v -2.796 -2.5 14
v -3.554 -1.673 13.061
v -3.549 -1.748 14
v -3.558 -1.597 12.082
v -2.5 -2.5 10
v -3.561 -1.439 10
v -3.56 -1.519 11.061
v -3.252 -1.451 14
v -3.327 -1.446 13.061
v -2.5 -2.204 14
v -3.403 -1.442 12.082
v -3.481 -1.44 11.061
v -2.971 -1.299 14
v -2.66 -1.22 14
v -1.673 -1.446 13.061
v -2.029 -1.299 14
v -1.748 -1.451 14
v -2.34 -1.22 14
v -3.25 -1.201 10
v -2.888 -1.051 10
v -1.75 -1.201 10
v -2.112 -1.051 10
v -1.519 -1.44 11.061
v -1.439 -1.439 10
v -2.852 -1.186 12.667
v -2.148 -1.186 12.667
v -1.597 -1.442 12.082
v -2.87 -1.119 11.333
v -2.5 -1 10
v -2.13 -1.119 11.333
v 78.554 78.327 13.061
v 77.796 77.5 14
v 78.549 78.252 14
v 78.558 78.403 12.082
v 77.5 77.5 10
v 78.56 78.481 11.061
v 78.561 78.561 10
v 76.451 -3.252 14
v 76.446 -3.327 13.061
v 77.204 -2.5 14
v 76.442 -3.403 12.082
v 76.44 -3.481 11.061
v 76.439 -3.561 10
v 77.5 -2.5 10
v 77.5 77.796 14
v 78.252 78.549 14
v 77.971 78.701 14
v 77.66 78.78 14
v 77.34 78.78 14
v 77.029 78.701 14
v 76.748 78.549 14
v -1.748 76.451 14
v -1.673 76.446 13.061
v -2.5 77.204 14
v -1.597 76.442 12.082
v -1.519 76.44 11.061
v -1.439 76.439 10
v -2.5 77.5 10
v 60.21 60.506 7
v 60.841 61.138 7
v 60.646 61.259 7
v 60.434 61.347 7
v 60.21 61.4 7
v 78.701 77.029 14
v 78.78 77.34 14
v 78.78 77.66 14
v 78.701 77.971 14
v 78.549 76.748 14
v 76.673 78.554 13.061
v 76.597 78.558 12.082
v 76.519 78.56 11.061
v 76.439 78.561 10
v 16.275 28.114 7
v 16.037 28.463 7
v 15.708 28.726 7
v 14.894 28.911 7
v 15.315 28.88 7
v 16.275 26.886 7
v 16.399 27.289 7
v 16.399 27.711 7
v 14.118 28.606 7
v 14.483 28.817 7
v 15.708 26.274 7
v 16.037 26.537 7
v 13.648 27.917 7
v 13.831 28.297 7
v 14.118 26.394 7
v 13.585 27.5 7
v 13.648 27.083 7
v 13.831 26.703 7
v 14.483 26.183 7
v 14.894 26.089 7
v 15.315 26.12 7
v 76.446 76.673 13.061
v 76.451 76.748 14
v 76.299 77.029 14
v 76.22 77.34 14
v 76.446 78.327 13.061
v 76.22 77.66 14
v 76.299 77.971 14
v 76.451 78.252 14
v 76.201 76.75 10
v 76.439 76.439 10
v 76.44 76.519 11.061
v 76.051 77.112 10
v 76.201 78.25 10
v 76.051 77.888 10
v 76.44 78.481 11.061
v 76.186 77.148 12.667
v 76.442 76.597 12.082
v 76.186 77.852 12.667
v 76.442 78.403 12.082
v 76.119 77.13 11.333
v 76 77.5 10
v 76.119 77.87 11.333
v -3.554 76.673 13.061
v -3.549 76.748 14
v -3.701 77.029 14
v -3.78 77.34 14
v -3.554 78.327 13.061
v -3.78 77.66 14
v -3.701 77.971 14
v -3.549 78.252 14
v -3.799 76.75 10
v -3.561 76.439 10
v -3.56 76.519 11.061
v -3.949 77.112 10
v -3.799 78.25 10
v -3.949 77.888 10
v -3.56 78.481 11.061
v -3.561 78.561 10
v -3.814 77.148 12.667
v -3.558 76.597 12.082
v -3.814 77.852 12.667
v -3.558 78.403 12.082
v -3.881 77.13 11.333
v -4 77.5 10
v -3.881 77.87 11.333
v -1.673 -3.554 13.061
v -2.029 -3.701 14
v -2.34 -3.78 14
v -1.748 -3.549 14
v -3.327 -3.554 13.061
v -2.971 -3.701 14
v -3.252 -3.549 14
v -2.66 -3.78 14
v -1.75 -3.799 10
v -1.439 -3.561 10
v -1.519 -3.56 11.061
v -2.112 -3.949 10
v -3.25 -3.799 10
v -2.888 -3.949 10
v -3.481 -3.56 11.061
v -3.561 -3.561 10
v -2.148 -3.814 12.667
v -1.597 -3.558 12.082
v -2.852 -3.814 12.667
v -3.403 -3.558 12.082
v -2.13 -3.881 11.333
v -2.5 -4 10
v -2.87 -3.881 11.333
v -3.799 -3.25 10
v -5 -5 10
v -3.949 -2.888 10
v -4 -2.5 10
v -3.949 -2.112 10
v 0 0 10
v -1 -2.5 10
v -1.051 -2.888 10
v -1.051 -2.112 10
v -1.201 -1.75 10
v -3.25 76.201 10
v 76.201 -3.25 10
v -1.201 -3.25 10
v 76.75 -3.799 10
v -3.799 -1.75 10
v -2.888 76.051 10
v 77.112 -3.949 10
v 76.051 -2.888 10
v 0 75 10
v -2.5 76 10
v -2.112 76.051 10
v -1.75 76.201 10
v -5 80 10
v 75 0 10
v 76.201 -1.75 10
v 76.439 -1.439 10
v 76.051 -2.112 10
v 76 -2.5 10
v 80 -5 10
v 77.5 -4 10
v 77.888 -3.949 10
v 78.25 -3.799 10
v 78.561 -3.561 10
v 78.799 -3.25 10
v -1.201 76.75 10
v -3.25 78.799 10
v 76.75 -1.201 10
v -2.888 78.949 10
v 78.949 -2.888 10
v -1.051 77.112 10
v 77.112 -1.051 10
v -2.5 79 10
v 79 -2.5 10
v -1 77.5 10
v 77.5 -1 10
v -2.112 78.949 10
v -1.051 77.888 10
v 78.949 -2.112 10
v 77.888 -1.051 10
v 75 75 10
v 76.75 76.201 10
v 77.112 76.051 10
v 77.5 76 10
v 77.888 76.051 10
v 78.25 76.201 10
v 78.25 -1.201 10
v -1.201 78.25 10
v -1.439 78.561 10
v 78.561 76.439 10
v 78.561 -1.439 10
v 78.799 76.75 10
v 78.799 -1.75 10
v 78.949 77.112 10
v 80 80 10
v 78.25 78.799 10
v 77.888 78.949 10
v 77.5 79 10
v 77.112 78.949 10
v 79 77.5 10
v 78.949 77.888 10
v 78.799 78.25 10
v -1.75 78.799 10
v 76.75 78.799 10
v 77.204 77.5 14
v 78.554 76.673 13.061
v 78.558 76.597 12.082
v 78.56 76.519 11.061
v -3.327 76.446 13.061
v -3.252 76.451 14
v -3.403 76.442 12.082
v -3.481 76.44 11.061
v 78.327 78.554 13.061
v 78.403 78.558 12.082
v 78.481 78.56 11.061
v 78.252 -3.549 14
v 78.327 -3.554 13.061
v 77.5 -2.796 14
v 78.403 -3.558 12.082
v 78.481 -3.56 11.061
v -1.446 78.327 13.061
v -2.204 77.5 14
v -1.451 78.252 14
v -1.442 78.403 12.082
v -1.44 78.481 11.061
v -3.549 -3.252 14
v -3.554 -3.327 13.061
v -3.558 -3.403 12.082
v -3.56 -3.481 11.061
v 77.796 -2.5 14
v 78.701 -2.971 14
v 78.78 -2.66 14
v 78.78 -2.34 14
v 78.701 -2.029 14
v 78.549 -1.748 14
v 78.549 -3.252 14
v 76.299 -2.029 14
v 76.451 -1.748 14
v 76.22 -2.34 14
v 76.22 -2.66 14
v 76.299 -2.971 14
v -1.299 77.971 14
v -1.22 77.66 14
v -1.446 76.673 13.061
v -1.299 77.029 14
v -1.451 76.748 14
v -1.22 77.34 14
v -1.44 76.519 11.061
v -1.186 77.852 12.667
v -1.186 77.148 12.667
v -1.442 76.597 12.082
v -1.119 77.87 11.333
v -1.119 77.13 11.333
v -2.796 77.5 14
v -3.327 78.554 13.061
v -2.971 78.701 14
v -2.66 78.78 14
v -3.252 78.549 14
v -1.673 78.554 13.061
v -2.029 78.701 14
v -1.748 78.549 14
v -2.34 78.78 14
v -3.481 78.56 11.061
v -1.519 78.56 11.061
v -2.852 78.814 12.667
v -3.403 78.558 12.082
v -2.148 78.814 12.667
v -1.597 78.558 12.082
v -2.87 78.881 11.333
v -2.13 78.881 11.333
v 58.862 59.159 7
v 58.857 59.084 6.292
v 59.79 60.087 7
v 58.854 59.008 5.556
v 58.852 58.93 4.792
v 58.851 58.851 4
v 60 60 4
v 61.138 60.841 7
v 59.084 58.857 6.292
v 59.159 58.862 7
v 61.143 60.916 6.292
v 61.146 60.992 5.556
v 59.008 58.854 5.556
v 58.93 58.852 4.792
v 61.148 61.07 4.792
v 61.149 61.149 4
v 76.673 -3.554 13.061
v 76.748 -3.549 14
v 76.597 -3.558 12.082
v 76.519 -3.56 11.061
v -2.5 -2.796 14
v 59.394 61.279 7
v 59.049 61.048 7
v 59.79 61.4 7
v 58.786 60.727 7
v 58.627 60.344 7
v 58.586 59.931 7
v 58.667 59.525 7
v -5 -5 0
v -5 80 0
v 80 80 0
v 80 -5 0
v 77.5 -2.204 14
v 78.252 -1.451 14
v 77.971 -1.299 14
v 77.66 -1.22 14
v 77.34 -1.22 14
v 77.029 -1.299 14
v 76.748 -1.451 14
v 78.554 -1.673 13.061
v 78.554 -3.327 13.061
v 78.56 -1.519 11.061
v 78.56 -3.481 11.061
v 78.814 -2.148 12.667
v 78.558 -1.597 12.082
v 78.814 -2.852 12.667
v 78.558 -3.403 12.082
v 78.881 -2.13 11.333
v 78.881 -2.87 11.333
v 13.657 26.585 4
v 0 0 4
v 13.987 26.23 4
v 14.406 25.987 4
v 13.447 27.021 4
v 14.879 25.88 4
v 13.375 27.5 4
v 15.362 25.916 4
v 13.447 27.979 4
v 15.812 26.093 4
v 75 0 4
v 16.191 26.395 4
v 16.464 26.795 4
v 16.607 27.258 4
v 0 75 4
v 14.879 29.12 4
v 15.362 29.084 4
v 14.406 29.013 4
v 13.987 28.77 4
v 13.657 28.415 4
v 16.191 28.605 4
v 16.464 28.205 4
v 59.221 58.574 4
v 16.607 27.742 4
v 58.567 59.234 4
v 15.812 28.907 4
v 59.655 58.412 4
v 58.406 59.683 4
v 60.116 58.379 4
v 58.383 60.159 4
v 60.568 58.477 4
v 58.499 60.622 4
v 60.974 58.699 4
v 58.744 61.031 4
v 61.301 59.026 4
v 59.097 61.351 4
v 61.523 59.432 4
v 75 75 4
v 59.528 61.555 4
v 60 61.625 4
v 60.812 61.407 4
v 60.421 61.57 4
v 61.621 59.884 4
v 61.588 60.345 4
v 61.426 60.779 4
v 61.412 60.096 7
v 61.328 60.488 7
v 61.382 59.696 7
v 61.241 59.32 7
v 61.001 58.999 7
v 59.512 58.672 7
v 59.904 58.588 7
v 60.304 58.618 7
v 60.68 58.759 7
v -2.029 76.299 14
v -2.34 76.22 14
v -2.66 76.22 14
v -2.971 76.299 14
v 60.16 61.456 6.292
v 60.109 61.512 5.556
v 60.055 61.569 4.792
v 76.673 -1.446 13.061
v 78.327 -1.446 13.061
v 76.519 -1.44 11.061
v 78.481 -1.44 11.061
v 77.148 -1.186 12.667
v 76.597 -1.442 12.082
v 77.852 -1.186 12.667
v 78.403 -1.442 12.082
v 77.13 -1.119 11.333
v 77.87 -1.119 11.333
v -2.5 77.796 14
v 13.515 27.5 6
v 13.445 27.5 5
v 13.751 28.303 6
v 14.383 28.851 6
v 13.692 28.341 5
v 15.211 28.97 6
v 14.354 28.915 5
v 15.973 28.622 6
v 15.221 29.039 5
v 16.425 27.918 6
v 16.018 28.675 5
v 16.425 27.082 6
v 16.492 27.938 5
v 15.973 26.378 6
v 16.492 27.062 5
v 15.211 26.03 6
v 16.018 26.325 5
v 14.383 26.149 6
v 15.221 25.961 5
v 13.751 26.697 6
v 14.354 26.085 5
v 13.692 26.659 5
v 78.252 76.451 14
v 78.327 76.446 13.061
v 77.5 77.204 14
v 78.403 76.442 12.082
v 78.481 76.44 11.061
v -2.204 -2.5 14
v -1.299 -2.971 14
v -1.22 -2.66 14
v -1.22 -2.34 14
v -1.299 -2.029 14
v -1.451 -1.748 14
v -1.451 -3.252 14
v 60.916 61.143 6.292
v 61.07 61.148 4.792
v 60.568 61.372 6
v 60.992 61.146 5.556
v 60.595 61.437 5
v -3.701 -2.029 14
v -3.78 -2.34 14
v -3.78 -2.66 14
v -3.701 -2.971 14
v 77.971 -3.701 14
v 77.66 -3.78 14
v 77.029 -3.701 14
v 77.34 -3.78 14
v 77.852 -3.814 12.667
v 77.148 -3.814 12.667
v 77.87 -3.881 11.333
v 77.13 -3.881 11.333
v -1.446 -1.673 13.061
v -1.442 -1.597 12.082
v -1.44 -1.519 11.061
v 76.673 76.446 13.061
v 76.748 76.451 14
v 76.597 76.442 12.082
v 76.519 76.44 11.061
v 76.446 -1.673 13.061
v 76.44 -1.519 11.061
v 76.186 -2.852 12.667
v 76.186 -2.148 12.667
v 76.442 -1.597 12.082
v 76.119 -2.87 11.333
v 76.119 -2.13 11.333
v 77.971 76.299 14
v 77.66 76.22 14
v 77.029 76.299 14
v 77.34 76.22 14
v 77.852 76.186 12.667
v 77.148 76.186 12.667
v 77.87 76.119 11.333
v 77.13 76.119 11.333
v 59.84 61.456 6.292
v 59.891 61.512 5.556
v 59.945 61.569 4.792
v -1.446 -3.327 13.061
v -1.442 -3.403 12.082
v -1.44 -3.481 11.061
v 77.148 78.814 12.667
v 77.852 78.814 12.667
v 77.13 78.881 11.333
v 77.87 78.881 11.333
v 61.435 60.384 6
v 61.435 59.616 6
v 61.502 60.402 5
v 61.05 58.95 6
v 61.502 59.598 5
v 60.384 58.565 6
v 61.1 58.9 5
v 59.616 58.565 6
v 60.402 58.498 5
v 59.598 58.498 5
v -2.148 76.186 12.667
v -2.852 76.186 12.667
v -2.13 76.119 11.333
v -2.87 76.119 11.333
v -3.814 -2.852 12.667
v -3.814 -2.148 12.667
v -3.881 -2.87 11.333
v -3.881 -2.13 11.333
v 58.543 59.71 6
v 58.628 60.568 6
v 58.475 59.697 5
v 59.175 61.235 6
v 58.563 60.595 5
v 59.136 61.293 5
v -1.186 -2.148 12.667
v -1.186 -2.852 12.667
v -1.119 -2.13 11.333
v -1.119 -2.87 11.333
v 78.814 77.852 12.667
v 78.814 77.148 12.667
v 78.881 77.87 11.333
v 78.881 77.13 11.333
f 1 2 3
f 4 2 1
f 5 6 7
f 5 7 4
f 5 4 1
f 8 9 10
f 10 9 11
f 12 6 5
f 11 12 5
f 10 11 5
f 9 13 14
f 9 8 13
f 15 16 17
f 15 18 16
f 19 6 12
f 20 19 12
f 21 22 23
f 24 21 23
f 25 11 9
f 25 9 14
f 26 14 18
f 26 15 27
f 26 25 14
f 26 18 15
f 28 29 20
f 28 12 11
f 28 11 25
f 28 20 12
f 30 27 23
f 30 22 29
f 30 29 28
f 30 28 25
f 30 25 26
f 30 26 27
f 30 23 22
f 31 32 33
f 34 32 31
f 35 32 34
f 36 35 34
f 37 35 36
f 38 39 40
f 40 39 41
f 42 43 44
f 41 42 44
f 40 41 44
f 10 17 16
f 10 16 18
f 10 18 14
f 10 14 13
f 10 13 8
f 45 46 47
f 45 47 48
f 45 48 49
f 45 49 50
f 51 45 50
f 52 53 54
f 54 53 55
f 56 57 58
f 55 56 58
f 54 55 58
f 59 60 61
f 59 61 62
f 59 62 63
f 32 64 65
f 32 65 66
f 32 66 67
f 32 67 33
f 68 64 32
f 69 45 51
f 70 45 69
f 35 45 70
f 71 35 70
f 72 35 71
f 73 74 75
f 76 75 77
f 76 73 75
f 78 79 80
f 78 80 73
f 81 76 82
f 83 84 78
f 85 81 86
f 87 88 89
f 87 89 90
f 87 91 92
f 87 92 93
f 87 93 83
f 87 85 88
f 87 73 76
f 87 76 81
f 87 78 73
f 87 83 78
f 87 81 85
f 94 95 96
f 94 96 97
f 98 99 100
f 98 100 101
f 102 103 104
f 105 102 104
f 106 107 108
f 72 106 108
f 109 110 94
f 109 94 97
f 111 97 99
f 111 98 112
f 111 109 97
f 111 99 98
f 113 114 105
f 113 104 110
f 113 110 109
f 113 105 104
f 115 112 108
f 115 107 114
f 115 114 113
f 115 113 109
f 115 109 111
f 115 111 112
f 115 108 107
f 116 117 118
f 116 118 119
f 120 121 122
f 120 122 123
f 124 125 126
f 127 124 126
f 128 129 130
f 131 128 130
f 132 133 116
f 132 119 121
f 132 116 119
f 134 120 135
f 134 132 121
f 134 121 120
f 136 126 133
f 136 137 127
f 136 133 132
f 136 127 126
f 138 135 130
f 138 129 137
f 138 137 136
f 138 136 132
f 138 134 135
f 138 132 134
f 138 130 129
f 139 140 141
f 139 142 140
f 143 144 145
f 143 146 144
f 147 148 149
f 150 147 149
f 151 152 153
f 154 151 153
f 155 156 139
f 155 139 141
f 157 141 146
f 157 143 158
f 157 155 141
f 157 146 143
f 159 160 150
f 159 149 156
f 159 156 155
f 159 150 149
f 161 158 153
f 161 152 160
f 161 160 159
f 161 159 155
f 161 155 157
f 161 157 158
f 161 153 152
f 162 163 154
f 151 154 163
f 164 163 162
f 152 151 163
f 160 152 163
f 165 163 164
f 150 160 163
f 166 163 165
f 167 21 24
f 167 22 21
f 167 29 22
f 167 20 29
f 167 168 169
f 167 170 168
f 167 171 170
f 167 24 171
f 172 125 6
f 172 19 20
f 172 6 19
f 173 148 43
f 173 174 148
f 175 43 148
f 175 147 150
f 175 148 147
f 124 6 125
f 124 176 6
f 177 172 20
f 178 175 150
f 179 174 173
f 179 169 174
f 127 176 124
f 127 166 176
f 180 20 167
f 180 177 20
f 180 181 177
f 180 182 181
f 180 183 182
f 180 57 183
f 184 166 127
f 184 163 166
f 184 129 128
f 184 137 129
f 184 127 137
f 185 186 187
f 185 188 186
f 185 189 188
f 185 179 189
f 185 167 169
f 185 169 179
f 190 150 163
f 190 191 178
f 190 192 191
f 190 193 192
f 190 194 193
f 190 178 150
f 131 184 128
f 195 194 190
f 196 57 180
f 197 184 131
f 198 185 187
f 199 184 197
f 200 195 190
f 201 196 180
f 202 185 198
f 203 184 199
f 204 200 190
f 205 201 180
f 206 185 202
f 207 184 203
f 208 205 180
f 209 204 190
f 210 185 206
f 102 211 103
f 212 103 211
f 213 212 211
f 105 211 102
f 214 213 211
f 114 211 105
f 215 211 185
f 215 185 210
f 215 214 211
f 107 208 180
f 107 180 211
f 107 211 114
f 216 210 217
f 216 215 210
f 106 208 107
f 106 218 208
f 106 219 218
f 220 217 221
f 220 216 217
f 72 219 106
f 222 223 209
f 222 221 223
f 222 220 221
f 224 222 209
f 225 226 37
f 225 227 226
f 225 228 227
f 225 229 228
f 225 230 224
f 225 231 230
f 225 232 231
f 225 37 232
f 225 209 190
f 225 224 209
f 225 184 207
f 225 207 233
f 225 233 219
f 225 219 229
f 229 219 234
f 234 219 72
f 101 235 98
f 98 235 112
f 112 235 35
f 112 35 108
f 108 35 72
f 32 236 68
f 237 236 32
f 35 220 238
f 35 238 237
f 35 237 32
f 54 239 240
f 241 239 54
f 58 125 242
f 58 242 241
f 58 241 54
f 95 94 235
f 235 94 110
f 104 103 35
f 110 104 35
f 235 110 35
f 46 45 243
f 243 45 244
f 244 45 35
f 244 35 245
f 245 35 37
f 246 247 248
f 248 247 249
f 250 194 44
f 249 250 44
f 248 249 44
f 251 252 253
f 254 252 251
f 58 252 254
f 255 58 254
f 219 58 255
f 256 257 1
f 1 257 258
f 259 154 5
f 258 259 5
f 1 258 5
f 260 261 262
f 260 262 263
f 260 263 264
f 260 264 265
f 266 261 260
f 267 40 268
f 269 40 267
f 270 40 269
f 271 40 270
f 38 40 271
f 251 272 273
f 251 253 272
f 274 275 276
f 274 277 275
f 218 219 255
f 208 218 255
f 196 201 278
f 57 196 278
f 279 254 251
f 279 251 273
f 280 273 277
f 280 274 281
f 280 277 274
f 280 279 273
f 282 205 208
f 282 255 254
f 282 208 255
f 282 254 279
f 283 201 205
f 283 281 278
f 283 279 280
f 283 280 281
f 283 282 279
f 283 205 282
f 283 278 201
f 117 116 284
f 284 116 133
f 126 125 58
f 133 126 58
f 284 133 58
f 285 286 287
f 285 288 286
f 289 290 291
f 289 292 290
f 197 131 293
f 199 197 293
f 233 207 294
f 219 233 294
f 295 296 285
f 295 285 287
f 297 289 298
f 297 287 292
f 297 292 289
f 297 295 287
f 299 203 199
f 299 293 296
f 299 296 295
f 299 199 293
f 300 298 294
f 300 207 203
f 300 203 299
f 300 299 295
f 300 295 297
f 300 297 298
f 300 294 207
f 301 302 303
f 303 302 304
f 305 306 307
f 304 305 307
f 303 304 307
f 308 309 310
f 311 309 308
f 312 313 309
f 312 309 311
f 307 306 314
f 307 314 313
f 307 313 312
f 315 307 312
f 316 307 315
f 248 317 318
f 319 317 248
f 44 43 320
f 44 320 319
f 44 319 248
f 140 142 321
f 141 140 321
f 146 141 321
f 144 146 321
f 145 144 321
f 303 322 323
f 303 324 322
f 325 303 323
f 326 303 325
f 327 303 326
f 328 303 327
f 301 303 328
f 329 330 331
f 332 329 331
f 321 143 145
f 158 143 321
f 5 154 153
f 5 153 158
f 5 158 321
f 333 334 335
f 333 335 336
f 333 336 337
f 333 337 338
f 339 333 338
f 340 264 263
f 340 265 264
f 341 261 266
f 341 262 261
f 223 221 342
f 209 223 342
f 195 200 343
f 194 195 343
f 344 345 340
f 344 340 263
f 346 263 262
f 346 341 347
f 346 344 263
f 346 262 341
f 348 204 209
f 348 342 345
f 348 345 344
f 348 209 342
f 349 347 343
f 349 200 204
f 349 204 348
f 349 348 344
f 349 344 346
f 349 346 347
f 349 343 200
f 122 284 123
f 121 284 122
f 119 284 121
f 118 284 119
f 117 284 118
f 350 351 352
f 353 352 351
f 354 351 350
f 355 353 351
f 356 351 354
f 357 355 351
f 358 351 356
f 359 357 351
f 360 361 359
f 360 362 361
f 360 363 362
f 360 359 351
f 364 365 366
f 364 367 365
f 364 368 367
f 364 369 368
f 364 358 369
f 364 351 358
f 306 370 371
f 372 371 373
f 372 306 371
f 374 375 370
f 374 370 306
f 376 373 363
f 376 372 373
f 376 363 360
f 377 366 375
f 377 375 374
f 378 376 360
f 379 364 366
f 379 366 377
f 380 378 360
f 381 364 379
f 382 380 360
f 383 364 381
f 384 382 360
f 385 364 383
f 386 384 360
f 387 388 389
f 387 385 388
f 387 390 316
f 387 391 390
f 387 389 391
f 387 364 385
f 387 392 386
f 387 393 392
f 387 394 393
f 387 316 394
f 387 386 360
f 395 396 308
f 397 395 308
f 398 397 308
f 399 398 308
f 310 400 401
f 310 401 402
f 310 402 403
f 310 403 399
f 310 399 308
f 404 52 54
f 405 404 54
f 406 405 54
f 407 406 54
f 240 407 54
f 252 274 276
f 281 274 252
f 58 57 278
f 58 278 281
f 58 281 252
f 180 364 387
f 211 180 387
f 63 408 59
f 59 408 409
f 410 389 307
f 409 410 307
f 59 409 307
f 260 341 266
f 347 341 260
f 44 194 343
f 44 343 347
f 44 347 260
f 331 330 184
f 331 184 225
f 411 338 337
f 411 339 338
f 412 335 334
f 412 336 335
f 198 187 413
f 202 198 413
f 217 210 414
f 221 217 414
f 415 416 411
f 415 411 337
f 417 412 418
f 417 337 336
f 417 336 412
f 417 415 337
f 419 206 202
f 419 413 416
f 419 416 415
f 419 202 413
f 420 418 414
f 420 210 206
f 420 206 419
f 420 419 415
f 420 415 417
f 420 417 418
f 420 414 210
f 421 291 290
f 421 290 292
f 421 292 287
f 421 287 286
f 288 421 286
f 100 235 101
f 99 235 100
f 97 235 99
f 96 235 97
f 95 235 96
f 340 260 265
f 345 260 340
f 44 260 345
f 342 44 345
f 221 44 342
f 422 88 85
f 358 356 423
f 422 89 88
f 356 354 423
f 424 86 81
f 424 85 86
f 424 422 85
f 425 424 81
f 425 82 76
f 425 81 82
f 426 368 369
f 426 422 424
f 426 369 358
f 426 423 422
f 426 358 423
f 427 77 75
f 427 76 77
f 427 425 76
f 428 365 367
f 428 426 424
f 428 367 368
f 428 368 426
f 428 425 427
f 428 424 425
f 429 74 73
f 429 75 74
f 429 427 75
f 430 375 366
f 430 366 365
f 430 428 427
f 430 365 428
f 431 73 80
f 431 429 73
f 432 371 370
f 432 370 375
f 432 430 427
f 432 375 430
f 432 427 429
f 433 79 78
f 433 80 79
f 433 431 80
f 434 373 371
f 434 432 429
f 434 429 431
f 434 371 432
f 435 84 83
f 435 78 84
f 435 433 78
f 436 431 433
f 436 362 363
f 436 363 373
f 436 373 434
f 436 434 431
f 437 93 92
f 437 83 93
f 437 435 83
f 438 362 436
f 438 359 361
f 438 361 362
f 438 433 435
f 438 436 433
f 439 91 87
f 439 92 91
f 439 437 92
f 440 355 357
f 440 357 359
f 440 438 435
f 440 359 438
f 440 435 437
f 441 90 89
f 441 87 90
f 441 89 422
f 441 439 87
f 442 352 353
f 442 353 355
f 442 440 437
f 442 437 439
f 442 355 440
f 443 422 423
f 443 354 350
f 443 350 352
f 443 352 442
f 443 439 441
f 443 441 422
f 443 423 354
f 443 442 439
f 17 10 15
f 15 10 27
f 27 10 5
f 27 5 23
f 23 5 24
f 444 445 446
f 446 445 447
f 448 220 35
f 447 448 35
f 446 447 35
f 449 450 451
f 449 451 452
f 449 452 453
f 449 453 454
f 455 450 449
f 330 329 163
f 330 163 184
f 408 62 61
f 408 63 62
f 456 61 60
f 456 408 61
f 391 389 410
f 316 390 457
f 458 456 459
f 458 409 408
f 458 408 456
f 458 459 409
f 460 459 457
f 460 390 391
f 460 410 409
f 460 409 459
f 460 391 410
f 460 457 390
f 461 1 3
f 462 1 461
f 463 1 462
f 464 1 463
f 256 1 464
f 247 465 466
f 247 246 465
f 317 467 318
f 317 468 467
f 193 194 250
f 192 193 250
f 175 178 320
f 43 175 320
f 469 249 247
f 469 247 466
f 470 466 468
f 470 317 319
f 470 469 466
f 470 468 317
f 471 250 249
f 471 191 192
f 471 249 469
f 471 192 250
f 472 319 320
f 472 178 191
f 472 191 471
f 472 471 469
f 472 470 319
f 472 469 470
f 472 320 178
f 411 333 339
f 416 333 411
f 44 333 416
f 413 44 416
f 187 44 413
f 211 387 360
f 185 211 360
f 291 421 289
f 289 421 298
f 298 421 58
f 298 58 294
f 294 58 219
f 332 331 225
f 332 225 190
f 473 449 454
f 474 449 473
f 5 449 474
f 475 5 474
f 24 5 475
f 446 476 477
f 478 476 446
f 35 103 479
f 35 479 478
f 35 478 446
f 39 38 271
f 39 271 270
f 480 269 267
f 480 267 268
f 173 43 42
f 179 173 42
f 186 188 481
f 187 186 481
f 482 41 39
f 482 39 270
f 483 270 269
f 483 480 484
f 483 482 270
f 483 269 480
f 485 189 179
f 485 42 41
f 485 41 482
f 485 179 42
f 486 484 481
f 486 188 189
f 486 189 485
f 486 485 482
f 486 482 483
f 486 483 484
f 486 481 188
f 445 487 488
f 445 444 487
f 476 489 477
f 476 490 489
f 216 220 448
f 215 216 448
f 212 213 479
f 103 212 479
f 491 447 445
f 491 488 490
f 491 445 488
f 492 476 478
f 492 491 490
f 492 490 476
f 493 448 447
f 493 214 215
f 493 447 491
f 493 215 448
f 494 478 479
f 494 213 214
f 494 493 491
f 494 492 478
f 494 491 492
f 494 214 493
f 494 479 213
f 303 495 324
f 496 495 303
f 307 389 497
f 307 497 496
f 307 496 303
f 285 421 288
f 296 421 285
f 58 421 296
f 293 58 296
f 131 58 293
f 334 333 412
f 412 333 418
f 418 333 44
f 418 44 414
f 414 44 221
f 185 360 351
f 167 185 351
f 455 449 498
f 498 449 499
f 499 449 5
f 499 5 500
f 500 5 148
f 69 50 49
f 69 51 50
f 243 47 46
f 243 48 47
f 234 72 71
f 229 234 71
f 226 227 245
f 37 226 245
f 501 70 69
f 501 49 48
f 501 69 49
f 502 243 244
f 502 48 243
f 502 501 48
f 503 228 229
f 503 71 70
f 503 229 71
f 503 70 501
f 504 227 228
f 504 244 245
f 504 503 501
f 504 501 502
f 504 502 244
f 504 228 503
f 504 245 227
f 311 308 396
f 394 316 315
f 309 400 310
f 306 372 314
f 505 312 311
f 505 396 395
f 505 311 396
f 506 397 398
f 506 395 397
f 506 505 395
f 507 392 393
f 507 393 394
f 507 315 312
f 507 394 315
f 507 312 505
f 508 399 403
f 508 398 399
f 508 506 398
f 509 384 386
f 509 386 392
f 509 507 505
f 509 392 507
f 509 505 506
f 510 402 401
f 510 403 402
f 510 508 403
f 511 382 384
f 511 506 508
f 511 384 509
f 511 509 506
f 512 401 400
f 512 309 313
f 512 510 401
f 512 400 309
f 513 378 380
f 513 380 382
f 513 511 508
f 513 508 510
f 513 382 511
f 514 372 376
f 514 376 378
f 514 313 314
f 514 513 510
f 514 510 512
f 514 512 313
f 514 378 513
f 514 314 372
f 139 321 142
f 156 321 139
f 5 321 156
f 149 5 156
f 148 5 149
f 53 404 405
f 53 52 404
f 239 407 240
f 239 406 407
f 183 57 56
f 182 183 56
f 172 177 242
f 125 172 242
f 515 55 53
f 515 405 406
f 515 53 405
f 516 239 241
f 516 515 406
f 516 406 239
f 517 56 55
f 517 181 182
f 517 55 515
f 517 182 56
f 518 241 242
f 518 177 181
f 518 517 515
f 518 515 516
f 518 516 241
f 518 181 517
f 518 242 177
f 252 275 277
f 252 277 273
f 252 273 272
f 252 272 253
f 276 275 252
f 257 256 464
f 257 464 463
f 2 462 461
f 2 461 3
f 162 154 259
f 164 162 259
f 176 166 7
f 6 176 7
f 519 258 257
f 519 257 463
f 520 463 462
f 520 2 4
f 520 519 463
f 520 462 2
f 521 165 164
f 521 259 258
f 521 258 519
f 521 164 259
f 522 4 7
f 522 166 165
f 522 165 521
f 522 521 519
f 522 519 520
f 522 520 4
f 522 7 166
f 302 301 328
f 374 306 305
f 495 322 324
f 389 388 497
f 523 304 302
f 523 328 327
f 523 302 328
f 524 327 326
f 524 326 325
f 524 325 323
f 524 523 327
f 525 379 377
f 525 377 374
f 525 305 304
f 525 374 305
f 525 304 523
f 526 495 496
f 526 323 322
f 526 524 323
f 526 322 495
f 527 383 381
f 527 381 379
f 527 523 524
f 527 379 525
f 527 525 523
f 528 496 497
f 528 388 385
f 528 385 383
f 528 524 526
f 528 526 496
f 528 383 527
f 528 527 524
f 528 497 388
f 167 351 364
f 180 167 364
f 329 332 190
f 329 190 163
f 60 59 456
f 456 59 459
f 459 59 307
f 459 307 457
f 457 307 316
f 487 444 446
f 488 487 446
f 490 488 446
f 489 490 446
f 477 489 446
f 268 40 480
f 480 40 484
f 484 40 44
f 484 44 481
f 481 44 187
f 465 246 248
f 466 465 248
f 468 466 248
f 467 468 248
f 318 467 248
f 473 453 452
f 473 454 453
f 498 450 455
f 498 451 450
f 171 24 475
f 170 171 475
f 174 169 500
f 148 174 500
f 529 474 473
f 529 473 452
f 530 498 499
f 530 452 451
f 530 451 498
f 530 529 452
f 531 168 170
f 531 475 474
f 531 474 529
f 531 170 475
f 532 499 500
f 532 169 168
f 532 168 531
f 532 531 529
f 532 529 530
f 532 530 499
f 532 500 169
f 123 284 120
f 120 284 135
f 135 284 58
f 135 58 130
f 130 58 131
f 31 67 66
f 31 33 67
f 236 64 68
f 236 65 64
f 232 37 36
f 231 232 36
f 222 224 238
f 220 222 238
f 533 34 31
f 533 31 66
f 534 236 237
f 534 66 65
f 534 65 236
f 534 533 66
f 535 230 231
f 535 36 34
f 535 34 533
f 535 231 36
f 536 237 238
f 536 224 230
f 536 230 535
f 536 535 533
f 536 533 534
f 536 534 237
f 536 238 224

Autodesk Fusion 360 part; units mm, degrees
sketch "Sketch1" plane through (0, 0, 0) normal (0, 0, 1) x (1, 0, 0)
  line L0 (0, 0) -> (0, 75)
  line L1 (0, 75) -> (75, 75)
  line L2 (75, 75) -> (75, 0)
  line L3 (75, 0) -> (0, 0)
  line L4 (-5, -5) -> (-5, 80)
  line L5 (-5, 80) -> (80, 80)
  line L6 (80, 80) -> (80, -5)
  line L7 (80, -5) -> (-5, -5)
  dimension "d1" = 75
  dimension "d2" = 75
  dimension "d3" = 75
  dimension "d4" = 75
  dimension "d5" = 85
  dimension "d6" = 85
  dimension "d7" = 85
  dimension "d8" = 85
extrude "Extrude1" add sketch "Sketch1" along normal blind 10
sketch "Sketch2" plane through (0, 0, 0) normal (0, 1, 0) x (1, 0, 0)
sketch "Sketch3" plane through (0, 0, 0) normal (0, 0, 1) x (1, 0, 0)
  line L0 (0, 0) -> (75, 0)
  line L1 (75, 0) -> (75, 75)
  line L2 (75, 75) -> (0, 75)
  line L3 (0, 75) -> (0, 0)
extrude "Extrude2" add sketch "Sketch3" along normal blind 4
sketch "Sketch4" plane through (0, 0, 4) normal (0, 0, 1) x (-1, 0, 0)
  line L0 (0, -75) -> (0, 0)
  line L1 (0, 0) -> (-75, 0)
  line L2 (-75, 0) -> (-75, -75)
  line L3 (-75, -75) -> (0, -75)
  line L4 (0, 0) -> (-75, -75)
  line L5 (-75, 0) -> (0, -75)
  line L6 (-37.5, -37.5) -> (-37.5, -65)
  line L7 (-37.5, -37.5) -> (-65, -37.5)
  line L8 (-65, -37.5) -> (-65, -10)
  line L9 (-37.5, -65) -> (-10, -65)
  line L10 (-10, -65) -> (-65, -65)
  line L11 (-65, -65) -> (-65, -10)
  line L12 (-65, -10) -> (-10, -10)
  line L13 (-10, -10) -> (-10, -65)
  line L14 (-65, -65) -> (-60, -65)
  line L15 (-60, -65) -> (-60, -60)
  circle A0 centre (-60, -60) radius 1.625
  line L16 (-10, -10) -> (-10, -27.5)
  line L17 (-10, -27.5) -> (-15, -27.5)
  circle A1 centre (-15, -27.5) radius 1.625
  dimension "d13" = 27.5
  dimension "d14" = 27.5
  dimension "d15" = 27.5
  dimension "d16" = 27.5
  dimension "d17" = 5
  dimension "d18" = 5
  dimension "d19" = 3.25
  dimension "d20" = 17.5
  dimension "d21" = 5
  dimension "d22" = 3.25
extrude "Extrude3" add sketch "Sketch4" along normal blind 3 draft -4 contours A1 | L4 A0 | L4 L15 A0 | L4 L15 A0
sketch "Sketch5" plane through (0, 0, 10) normal (0, 0, 1) x (-1, 0, 0)
  line L0 (-75, -75) -> (-75, 0)
  line L1 (-75, 0) -> (0, 0)
  line L2 (0, 0) -> (0, -75)
  line L3 (0, -75) -> (-75, -75)
  line L4 (-80, 5) -> (-80, -80)
  line L5 (-80, -80) -> (5, -80)
  line L6 (5, -80) -> (5, 5)
  line L7 (5, 5) -> (-80, 5)
  line L8 (5, 5) -> (0, 0)
  line L9 (5, 0) -> (0, 5)
  circle A0 centre (2.5, 2.5) radius 1.5
  line L10 (-75, -75) -> (-80, -80)
  line L11 (-80, -75) -> (-75, -80)
  circle A1 centre (-77.5, -77.5) radius 1.5
  line L12 (0, -75) -> (5, -80)
  line L13 (5, -75) -> (0, -80)
  circle A2 centre (2.5, -77.5) radius 1.5
  line L14 (-80, 5) -> (-75, 0)
  line L15 (-75, 5) -> (-80, 0)
  circle A3 centre (-77.5, 2.5) radius 1.5
  dimension "d25" = 3
  dimension "d26" = 3
  dimension "d27" = 3
  dimension "d28" = 3
extrude "Extrude4" add sketch "Sketch5" along normal blind 4 draft -3 contours L10 L11 A1 | L10 L11 A1 | L14 L15 A3 | L14 L15 A3 | L12 L13 A2 | L12 L13 A2 | L10 L11 A1 | L10 L11 A1 | L8 L9 A0 | L8 L9 A0 | L14 L15 A3 | L14 L15 A3 | L12 L13 A2 | L12 L13 A2 | L8 L9 A0 | L8 L9 A0
sketch "Sketch6" plane through (0, 0, 7) normal (0, 0, 1) x (-1, 0, 0)
  circle A0 centre (-60, -60) radius 1.4152
equation "d13 = ( 55 / 2 ) * 1 mm"
equation "d14 = ( 55 / 2 ) * 1 mm"
equation "d15 = ( 55 / 2 ) * 1 mm"
equation "d16 = ( 55 / 2 ) * 1 mm"
